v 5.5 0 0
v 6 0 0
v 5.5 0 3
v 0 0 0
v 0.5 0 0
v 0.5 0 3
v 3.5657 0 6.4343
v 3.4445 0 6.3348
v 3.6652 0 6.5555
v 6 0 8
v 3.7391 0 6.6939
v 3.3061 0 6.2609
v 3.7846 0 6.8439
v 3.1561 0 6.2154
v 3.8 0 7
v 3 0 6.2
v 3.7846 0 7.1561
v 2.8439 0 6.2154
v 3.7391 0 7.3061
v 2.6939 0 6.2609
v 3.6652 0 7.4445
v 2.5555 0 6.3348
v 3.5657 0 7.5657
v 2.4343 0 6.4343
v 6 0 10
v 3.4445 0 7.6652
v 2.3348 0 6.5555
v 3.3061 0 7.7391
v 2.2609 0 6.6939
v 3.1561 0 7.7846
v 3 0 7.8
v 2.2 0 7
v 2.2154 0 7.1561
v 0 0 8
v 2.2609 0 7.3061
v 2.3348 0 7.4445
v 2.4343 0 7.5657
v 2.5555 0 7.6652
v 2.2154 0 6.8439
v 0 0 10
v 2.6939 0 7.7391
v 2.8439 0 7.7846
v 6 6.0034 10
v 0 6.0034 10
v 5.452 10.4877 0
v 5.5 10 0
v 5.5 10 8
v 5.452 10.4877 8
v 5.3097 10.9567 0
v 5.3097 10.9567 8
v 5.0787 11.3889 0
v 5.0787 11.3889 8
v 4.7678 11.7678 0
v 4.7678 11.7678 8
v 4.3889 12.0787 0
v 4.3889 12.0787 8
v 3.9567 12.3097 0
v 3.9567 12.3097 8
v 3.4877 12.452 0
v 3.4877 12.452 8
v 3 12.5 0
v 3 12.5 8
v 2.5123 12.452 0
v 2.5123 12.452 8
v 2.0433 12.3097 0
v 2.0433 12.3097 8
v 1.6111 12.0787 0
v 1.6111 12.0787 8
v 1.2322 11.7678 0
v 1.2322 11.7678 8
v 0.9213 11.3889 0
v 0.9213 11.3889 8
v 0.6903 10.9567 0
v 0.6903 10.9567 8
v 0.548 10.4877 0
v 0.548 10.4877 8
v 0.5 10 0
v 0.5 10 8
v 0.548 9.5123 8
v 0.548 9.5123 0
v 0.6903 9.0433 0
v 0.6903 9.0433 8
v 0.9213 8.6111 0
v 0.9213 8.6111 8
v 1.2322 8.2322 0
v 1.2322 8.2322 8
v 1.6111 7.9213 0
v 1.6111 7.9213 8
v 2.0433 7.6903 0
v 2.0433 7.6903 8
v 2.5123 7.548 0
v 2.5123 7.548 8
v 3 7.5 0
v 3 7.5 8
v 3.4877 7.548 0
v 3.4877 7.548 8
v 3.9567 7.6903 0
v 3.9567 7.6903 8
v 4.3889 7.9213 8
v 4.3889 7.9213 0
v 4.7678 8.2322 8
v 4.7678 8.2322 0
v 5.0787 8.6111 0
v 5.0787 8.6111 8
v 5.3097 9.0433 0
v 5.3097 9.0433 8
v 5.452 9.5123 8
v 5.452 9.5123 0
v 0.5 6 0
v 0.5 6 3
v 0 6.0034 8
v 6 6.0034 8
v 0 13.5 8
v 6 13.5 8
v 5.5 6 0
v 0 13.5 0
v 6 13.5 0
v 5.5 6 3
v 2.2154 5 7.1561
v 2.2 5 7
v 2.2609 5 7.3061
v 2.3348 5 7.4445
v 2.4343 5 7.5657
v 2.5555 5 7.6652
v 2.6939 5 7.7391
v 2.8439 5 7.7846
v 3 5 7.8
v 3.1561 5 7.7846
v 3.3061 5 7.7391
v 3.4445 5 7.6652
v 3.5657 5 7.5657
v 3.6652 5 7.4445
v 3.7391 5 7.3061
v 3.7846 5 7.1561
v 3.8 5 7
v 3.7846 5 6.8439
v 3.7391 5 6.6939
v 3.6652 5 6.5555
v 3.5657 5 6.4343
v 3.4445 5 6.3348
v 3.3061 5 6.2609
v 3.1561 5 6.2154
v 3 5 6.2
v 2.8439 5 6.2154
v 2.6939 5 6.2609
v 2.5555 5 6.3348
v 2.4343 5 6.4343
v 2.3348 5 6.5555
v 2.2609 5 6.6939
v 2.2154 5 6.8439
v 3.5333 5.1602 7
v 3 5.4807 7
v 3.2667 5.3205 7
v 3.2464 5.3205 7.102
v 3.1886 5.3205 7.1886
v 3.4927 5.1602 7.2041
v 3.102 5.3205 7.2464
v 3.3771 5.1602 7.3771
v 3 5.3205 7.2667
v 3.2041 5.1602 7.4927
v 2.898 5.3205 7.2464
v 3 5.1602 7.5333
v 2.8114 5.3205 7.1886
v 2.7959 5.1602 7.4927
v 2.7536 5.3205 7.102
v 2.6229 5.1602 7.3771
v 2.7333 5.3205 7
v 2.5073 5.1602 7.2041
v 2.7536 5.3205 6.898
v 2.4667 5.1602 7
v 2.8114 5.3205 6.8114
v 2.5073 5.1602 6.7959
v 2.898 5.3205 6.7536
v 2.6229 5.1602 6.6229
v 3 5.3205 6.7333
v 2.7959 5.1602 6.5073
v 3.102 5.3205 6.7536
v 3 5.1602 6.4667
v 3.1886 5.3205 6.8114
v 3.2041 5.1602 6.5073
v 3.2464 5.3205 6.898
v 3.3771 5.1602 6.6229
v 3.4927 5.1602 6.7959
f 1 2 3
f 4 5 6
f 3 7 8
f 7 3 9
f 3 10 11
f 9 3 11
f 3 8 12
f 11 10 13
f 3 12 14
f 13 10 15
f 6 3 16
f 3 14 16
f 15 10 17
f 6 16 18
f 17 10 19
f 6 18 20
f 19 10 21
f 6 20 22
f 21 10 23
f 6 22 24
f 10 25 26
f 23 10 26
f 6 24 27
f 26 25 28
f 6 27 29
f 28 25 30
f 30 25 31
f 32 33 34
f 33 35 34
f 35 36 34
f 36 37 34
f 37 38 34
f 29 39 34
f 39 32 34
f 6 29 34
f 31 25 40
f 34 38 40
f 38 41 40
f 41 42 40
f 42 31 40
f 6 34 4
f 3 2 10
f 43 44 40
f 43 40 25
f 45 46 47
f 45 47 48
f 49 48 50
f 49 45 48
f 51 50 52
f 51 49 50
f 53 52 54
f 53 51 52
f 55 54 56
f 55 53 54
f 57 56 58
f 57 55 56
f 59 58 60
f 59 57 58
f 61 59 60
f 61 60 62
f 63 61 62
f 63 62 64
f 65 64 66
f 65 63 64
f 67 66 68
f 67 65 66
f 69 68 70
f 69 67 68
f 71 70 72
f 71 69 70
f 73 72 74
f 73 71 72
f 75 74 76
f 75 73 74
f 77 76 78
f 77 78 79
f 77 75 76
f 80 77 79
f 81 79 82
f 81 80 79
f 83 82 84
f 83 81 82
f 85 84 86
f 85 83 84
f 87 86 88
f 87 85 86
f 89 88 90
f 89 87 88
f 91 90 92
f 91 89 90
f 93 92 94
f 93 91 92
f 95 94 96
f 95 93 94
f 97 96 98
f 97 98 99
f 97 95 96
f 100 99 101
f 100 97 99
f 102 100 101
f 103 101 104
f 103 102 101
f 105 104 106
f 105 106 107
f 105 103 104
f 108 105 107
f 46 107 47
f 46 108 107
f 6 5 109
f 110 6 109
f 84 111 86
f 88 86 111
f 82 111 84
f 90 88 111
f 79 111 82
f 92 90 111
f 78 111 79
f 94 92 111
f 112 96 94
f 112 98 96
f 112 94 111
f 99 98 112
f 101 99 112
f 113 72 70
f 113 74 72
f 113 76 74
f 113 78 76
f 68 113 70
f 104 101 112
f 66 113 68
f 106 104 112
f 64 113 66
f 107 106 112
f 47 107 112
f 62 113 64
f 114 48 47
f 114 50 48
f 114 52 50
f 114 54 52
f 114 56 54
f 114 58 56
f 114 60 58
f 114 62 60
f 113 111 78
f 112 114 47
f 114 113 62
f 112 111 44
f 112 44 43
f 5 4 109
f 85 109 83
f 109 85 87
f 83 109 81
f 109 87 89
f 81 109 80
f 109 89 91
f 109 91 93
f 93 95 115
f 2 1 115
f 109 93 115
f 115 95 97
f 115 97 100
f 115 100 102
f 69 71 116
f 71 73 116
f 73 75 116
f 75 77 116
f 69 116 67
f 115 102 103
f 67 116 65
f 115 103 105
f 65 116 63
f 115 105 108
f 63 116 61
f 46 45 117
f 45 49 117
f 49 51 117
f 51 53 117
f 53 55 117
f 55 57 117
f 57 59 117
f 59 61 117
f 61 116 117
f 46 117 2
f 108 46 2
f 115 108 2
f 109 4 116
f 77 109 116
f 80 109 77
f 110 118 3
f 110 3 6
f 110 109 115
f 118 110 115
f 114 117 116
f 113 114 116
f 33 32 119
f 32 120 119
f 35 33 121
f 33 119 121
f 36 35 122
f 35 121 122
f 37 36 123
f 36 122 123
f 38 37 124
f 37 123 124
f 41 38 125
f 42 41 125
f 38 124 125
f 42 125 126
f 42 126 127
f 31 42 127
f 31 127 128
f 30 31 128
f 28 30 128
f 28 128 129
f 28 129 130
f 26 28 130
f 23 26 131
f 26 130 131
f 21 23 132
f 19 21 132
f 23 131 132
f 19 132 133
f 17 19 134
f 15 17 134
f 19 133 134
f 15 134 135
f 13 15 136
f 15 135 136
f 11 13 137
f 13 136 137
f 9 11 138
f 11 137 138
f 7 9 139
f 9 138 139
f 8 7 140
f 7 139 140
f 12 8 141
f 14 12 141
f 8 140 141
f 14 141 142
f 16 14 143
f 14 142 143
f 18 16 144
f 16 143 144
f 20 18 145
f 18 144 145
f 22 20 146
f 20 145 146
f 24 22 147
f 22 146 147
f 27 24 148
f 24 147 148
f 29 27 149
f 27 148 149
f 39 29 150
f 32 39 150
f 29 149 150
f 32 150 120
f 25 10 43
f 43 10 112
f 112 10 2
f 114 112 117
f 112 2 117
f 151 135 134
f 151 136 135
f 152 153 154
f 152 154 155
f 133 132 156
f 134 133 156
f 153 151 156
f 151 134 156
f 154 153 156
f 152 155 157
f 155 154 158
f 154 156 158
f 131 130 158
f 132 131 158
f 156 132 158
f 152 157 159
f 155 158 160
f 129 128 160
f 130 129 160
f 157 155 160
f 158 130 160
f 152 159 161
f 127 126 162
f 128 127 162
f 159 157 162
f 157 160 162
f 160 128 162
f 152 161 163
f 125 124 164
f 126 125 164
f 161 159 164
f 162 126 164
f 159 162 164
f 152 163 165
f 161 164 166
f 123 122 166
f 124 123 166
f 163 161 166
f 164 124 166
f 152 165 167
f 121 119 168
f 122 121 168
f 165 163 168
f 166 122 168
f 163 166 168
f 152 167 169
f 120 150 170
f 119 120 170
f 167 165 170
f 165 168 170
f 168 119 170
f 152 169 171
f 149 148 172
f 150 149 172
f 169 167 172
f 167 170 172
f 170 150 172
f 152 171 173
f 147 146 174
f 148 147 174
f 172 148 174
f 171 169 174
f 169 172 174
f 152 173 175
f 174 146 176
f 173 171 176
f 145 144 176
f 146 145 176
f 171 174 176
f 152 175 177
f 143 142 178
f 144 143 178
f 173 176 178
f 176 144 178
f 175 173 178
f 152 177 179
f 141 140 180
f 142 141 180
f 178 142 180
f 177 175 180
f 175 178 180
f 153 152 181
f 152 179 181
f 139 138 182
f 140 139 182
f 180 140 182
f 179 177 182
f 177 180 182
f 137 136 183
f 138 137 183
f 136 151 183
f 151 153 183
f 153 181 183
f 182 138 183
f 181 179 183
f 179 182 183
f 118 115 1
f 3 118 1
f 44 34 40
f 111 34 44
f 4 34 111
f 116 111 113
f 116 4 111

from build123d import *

# Parameters (mm, degrees)
SKETCH_1_R             = 2.5
EXTRUDE_1_DEPTH        = 8
SKETCH_5_W             = 6
SKETCH_5_H             = 6.003393665
EXTRUDE_4_DEPTH        = 2
SKETCH_6_W             = 5
SKETCH_6_H             = 6
EXTRUDE_5_DEPTH        = 5
HOLE_WIZARD_M2_1_D     = 1.6
HOLE_WIZARD_M2_1_DEPTH = 5
HOLE_WIZARD_M2_1_TIP   = 0.480688495


with BuildPart() as part:
    # 스케치1 → 돌출1 (new body)
    with BuildSketch(Plane.XY):
        Polygon((0, 0), (0.5, 0), (0.5, 6), (5.5, 6), (5.5, 0), (6, 0), (6, 13.5), (0, 13.5), align=None)
        with Locations((3, 10)):
            Circle(SKETCH_1_R, mode=Mode.SUBTRACT)
    extrude(amount=EXTRUDE_1_DEPTH)

    # 스케치5 → 돌출4 (add)
    with BuildSketch(Plane.XY.offset(8)):
        with Locations((3, 3.001696832)):
            Rectangle(SKETCH_5_W, SKETCH_5_H)
    extrude(amount=EXTRUDE_4_DEPTH)

    # 스케치6 → 돌출5 (add)
    with BuildSketch(Plane(origin=(0, 0, 8), x_dir=(-1, 0, 0), z_dir=(0, 0, -1))):
        with Locations((-3, 3)):
            Rectangle(SKETCH_6_W, SKETCH_6_H)
    extrude(amount=EXTRUDE_5_DEPTH)

    # M2 탭을 위한 탭 드릴1
    with Locations(Plane.XZ):
        with Locations((3, 7)):
            Hole(HOLE_WIZARD_M2_1_D / 2, depth=HOLE_WIZARD_M2_1_DEPTH)
            with Locations((0, 0, -(HOLE_WIZARD_M2_1_DEPTH + HOLE_WIZARD_M2_1_TIP / 2))):  # 118° drill point
                Cone(0, HOLE_WIZARD_M2_1_D / 2, HOLE_WIZARD_M2_1_TIP, mode=Mode.SUBTRACT)


solid = part.part
